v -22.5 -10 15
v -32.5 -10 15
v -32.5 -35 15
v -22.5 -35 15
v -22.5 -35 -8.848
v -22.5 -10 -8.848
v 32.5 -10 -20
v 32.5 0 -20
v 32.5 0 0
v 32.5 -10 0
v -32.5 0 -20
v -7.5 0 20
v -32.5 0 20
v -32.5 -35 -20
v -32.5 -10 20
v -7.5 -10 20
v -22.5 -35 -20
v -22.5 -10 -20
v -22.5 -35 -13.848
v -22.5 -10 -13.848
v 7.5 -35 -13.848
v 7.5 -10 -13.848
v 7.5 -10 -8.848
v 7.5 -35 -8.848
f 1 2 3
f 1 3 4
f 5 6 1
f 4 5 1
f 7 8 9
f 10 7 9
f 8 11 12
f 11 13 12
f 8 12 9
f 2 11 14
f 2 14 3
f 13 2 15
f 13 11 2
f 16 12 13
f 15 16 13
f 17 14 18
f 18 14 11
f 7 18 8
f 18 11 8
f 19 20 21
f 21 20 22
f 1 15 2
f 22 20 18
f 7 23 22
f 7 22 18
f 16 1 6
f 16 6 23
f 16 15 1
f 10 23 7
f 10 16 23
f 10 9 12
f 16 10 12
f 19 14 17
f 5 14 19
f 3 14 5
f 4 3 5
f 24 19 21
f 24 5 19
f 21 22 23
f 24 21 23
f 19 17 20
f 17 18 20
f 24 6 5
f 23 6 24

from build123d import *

# Parameters (mm, degrees)
F1_DEPTH = 10
F2_DEPTH = 35
F0_W     = 10
F0_H     = 15
F3_DEPTH = 35
F0_W_2   = 30
F0_H_2   = 5
F4_DEPTH = 35


with BuildPart() as f1:
    # F0 (on Front) → F1 (new body)
    with BuildSketch(Plane.XZ):
        Polygon((-22.5, -20), (32.5, -20), (32.5, 0), (-7.5, 20), (-32.5, 20), (-32.5, 15), (-22.5, 15), (-22.5, 0), (-22.5, -8.847731), (7.5, -8.847731), (7.5, -13.847731), (-22.5, -13.847731), align=None)
    extrude(amount=F1_DEPTH)

    # F0 (on Front) → F2 (join)
    with BuildSketch(Plane.XZ):
        Polygon((-32.5, -20), (-22.5, -20), (-22.5, -13.847731), (-22.5, -8.847731), (-22.5, 0), (-32.5, 0), align=None)
    extrude(amount=F2_DEPTH)

    # F0 (on Front) → F3 (join)
    with BuildSketch(Plane.XZ):
        with Locations((-27.5, 7.5)):
            Rectangle(F0_W, F0_H)
    extrude(amount=F3_DEPTH)

    # F0 (on Front) → F4 (join)
    with BuildSketch(Plane.XZ):
        with Locations((-7.5, -11.347731)):
            Rectangle(F0_W_2, F0_H_2)
    extrude(amount=F4_DEPTH)


solid = f1.part
